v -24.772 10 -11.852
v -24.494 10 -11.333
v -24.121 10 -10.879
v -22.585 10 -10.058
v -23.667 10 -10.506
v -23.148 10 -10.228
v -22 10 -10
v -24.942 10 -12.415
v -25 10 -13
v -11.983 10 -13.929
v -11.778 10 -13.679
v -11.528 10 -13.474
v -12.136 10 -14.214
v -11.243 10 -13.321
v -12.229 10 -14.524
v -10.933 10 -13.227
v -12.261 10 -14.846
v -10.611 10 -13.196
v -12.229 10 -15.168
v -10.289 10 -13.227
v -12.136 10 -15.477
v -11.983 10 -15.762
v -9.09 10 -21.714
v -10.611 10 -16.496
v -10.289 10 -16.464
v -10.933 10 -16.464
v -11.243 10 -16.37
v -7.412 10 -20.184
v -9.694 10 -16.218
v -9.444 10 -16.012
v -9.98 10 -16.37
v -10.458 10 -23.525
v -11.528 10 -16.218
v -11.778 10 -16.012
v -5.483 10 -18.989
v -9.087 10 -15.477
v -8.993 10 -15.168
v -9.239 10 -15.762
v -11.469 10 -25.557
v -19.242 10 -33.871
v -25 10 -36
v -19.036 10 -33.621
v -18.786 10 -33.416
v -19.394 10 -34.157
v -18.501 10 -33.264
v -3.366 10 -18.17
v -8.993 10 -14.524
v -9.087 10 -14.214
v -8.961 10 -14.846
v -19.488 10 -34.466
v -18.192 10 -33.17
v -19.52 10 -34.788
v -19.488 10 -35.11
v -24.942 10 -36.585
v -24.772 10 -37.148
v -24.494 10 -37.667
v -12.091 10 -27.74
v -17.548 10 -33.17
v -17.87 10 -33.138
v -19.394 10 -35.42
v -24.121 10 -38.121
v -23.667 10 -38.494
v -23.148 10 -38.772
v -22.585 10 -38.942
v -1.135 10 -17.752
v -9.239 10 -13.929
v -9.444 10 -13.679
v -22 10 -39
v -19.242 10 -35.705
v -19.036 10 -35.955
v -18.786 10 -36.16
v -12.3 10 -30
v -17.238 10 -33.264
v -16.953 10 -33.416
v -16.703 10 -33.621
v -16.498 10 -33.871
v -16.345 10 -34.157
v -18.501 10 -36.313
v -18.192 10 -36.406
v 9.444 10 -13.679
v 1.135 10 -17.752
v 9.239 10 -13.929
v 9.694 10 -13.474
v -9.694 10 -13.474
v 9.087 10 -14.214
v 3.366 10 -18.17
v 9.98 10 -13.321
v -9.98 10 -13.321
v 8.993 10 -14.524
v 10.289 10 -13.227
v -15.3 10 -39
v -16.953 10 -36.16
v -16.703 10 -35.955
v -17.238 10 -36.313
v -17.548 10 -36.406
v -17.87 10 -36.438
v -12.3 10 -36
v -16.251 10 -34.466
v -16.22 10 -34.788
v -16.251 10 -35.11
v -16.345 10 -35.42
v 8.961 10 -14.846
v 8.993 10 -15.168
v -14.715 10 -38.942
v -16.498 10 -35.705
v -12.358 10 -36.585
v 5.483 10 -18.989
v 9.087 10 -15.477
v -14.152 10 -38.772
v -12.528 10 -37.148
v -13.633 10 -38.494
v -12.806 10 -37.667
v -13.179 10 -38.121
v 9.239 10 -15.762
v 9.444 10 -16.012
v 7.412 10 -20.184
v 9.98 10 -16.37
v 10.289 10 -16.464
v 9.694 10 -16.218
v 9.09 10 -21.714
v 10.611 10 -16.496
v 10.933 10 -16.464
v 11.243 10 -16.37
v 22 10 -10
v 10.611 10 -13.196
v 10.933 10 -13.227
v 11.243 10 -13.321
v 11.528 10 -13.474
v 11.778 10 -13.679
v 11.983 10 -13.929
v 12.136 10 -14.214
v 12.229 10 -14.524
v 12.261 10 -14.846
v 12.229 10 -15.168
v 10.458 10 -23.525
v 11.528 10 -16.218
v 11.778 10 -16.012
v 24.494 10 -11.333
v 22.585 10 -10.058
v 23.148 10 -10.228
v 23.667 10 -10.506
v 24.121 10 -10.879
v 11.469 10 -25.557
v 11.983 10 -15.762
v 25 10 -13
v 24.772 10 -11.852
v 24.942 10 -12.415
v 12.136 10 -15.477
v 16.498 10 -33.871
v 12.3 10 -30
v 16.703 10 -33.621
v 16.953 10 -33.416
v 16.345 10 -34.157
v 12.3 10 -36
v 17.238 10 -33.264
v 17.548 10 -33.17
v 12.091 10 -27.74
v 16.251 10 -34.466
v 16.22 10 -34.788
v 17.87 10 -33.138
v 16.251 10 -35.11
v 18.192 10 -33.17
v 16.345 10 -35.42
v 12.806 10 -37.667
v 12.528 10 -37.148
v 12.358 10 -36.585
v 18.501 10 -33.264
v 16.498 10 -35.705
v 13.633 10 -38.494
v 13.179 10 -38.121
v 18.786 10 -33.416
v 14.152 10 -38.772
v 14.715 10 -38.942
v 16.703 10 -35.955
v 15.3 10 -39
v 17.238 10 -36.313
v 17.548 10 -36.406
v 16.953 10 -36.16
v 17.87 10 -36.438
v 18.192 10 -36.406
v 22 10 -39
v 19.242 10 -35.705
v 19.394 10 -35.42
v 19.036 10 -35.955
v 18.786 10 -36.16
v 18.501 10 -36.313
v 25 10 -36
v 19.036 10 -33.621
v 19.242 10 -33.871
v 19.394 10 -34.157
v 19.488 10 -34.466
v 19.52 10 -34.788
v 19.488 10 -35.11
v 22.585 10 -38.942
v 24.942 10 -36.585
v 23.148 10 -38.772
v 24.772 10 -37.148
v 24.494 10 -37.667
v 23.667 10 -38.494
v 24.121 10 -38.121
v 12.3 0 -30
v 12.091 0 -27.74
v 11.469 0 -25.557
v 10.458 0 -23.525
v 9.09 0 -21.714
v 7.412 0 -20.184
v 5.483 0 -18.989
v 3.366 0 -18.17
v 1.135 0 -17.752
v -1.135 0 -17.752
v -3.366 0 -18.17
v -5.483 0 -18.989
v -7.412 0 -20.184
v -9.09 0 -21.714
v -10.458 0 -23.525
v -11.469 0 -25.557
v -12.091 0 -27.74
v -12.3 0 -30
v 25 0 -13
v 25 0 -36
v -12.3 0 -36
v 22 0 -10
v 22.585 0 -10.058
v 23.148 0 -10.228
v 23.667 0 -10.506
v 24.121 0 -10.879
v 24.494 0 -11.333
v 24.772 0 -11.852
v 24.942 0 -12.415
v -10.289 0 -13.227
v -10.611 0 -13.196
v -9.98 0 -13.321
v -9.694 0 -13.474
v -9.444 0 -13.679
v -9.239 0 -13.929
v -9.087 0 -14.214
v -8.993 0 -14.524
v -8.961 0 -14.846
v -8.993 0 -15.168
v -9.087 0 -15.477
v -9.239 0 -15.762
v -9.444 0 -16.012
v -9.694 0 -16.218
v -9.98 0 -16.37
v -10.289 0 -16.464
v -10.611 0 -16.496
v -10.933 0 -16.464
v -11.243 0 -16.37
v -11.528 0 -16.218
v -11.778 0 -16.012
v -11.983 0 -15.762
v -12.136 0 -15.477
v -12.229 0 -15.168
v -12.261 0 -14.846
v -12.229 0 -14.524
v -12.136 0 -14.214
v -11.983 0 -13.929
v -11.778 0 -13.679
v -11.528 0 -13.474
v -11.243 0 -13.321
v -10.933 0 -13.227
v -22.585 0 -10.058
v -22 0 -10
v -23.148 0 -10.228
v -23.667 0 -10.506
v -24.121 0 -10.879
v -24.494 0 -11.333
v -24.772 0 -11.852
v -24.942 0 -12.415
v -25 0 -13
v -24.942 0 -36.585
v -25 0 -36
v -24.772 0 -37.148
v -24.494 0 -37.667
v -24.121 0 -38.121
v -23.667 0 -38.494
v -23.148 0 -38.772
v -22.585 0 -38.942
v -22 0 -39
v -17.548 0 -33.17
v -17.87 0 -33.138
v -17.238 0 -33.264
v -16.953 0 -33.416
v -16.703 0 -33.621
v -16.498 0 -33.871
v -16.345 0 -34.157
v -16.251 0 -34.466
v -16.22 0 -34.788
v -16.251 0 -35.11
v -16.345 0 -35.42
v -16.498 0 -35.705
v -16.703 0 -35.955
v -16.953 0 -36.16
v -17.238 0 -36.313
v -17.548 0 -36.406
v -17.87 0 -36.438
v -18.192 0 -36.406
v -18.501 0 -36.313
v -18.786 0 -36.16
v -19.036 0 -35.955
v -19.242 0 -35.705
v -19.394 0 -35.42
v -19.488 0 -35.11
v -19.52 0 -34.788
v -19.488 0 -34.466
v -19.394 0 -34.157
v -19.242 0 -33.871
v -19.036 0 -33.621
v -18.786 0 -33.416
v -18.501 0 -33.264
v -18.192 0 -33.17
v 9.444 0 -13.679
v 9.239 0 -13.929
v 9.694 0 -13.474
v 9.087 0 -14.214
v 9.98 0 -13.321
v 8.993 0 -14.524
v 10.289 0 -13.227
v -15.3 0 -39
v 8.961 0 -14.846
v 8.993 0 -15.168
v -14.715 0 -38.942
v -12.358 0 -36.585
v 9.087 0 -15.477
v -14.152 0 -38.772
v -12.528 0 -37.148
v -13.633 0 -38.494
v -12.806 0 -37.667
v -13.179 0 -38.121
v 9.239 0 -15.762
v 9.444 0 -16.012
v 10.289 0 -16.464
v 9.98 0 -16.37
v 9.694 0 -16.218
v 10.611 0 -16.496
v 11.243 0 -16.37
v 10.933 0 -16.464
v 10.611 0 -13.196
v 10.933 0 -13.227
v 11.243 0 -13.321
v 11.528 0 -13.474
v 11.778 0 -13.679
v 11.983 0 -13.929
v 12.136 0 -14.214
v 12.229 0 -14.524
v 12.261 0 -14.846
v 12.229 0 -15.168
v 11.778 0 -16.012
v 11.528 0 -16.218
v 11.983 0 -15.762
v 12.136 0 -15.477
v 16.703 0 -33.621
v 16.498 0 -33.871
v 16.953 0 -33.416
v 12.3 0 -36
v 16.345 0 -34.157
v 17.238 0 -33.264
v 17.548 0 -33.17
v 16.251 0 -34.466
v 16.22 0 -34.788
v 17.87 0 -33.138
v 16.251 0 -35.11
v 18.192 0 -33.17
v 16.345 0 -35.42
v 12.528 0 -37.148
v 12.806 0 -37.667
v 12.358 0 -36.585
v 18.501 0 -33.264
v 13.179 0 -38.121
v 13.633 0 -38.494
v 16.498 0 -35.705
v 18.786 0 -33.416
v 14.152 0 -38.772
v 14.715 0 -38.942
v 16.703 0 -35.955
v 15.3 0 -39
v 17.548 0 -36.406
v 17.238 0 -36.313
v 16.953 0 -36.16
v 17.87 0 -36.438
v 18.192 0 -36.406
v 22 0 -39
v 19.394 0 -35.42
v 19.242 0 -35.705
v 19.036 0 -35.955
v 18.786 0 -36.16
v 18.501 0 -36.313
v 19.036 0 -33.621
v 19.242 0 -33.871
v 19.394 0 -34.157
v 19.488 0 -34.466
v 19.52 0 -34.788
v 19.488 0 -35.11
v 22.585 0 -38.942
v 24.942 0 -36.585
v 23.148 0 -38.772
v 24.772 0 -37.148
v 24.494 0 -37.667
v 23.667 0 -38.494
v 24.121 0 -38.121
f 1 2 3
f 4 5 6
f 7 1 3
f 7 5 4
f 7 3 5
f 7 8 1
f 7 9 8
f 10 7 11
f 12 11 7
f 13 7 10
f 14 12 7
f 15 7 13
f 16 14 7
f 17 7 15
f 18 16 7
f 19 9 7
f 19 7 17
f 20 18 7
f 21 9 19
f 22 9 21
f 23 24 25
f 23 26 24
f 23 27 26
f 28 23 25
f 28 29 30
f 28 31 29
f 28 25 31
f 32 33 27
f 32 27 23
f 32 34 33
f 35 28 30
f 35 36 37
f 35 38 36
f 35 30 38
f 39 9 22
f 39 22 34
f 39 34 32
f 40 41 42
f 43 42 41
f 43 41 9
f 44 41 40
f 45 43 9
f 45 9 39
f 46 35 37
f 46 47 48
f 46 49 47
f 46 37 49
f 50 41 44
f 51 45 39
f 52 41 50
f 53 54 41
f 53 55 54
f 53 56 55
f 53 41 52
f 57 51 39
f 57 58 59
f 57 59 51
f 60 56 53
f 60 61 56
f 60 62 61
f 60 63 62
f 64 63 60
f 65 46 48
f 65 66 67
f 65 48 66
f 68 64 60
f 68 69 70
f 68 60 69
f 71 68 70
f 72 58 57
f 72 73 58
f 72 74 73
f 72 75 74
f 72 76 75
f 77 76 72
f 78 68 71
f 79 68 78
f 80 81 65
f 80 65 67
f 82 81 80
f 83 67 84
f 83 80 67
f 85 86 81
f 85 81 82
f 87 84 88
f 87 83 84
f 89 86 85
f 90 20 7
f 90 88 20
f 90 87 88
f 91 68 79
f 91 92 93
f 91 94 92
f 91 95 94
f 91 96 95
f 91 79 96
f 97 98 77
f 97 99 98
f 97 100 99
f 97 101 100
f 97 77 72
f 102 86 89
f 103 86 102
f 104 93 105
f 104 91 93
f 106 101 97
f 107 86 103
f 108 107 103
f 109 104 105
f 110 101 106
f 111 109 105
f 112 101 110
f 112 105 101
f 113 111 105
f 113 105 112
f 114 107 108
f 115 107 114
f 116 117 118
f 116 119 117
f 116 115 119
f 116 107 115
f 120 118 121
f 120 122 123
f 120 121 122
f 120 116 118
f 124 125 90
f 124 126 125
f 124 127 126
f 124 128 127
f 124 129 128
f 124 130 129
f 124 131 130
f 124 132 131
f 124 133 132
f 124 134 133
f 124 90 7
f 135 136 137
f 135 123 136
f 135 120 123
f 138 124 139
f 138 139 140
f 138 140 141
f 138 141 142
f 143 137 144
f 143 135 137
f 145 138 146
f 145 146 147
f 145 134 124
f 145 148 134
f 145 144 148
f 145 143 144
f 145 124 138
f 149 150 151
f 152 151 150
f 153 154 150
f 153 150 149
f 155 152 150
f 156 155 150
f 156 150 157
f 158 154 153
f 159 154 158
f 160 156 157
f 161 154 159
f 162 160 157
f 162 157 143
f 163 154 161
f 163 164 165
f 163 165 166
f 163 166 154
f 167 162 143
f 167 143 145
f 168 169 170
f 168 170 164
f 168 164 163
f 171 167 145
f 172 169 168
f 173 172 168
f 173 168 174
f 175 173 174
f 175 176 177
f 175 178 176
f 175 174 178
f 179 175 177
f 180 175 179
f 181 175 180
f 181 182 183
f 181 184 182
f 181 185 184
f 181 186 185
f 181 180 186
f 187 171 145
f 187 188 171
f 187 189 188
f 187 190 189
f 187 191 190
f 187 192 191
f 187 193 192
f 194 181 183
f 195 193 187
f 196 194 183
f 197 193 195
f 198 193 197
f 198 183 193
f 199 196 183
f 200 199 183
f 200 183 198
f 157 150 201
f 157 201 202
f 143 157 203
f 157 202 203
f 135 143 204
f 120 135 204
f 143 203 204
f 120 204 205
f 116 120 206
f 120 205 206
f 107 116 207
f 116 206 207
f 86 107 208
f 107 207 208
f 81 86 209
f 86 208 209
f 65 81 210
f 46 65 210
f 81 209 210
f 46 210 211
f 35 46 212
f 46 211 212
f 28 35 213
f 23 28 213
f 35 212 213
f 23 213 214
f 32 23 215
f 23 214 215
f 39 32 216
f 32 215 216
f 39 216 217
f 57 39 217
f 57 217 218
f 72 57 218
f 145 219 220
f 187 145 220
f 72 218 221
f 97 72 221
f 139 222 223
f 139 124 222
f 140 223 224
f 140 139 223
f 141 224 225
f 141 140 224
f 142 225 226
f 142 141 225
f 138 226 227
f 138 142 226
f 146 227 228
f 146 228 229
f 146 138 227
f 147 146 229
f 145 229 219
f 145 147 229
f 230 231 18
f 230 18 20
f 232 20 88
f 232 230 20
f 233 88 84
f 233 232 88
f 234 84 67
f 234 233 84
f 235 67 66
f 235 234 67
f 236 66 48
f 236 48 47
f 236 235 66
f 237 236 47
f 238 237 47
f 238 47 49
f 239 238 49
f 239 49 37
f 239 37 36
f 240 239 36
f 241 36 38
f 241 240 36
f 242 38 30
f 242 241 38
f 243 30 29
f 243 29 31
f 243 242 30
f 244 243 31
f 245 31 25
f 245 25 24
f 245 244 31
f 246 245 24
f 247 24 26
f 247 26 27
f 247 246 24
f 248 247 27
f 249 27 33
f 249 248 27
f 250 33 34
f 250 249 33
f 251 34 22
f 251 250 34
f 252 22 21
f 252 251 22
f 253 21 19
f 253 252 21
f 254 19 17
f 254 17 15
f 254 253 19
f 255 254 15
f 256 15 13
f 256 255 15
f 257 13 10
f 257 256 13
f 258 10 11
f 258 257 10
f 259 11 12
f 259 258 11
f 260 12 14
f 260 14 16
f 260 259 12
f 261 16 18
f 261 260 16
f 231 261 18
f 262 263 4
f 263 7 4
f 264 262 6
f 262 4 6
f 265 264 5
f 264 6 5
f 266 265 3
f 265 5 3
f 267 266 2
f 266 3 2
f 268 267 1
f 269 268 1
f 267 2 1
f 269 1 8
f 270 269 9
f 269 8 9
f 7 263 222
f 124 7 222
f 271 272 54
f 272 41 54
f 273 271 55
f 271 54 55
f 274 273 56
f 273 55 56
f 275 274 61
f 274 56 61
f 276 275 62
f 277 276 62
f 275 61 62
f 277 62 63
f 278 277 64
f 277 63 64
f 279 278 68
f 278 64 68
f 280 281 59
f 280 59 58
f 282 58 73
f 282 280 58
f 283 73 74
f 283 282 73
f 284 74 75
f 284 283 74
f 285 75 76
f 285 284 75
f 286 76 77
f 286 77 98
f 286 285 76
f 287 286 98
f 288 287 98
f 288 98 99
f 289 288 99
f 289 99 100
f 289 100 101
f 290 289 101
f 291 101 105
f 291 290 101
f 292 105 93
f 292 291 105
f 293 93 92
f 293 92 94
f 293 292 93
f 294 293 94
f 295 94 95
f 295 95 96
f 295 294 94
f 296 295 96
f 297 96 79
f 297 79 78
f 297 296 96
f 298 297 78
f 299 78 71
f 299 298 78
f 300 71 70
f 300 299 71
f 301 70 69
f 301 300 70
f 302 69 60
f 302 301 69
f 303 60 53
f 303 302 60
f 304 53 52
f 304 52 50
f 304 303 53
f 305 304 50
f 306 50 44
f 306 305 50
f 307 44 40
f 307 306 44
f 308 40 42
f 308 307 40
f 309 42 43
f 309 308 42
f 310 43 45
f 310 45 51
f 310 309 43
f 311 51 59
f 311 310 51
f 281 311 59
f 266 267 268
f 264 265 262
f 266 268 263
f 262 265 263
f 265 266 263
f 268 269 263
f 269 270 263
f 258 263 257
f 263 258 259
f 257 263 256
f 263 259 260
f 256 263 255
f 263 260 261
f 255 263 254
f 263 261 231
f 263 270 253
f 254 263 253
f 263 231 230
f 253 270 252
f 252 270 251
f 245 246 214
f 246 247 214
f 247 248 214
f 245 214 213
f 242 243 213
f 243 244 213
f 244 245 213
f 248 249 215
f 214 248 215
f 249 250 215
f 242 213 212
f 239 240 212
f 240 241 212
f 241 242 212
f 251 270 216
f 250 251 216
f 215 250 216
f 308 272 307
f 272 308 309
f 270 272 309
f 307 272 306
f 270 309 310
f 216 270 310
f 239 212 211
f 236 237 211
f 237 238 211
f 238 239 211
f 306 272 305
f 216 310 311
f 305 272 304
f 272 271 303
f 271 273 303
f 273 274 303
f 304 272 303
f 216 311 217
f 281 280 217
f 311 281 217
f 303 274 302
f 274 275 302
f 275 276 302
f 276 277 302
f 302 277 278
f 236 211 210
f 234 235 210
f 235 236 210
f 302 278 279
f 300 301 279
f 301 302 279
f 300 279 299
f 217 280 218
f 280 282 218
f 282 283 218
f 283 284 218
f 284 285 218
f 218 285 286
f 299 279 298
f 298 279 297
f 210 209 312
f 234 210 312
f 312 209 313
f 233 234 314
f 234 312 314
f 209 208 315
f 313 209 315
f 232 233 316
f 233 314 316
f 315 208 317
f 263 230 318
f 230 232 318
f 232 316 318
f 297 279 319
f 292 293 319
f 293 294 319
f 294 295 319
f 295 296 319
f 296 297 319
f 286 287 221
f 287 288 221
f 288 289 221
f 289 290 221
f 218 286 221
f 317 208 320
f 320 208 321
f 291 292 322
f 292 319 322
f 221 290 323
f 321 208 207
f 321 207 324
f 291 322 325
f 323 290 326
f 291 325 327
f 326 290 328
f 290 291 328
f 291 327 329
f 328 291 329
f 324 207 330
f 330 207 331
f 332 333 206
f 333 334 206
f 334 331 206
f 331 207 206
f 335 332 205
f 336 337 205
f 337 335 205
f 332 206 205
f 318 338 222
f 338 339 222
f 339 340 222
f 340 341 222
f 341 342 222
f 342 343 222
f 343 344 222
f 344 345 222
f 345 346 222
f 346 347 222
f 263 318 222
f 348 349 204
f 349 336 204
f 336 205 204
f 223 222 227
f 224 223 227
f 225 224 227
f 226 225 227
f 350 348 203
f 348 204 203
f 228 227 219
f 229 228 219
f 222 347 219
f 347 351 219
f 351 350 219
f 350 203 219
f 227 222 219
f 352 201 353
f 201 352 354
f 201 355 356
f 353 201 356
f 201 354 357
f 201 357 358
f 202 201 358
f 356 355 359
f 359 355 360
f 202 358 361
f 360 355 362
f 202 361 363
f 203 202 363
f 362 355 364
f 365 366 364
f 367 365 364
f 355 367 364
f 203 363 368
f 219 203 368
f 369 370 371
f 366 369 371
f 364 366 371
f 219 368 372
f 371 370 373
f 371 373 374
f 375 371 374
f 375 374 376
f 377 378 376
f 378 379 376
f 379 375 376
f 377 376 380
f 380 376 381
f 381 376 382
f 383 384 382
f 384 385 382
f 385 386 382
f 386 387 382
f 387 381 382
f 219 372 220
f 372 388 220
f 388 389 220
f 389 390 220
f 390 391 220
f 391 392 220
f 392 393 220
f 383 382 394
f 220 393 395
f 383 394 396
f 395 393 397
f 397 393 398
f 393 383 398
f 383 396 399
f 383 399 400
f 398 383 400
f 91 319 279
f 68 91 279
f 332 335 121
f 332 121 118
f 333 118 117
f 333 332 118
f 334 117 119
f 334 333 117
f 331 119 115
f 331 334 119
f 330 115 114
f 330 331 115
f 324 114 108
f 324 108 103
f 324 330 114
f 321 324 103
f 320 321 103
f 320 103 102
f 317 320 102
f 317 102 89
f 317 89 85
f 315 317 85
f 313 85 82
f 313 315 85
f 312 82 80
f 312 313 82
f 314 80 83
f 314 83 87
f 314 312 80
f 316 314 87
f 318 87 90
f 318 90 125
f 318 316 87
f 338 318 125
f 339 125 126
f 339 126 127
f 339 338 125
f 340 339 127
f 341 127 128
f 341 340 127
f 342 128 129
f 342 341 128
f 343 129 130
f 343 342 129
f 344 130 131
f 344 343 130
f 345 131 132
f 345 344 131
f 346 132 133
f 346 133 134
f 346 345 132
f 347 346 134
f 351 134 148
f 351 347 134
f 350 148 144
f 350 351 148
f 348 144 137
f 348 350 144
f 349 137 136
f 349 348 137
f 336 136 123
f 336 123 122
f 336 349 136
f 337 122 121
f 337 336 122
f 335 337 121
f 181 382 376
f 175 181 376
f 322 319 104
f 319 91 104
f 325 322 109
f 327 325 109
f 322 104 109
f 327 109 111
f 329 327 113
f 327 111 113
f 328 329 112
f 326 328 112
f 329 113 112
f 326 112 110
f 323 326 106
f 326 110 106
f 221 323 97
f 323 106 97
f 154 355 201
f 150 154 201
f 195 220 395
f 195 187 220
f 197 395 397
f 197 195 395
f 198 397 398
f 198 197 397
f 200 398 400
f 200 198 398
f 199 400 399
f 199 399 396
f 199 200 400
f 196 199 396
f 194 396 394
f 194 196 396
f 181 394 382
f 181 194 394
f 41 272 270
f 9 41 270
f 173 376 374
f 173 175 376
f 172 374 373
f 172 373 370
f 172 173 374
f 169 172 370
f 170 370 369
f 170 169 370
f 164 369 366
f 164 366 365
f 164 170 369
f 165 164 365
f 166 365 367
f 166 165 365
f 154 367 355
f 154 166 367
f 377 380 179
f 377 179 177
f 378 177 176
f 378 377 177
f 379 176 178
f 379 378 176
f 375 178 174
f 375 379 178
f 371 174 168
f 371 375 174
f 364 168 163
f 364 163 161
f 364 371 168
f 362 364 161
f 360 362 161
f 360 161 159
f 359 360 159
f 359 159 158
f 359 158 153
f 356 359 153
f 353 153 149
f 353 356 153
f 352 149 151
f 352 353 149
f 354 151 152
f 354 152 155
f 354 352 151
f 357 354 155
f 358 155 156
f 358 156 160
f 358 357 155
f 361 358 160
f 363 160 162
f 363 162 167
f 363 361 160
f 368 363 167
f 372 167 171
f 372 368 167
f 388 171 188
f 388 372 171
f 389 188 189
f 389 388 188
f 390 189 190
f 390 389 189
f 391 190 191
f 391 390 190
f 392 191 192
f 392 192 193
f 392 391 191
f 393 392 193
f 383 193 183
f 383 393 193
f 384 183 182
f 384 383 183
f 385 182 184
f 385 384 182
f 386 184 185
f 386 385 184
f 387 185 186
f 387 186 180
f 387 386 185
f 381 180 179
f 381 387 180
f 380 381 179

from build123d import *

# Parameters (mm, degrees)
SKETCH_1_R      = 1.65
EXTRUDE_1_DEPTH = 10
FILLET_1_R      = 3


with BuildPart() as part:
    # 草图1 → 凸台-拉伸1 (new body)
    with BuildSketch(Plane(origin=(0, 0, 0), x_dir=(1, 0, 0), z_dir=(0, 1, 0))):
        with BuildLine():
            Line((-25, 30), (-25, 10))
            Line((-25, 10), (25, 10))
            Line((25, 10), (25, 30))
            Line((25, 30), (25, 39))
            Line((25, 39), (12.3, 39))
            Line((12.3, 39), (12.3, 30))
            ThreePointArc((12.3, 30), (0, 17.7), (-12.3, 30))
            Line((-12.3, 30), (-12.3, 39))
            Line((-12.3, 39), (-25, 39))
            Line((-25, 39), (-25, 30))
        make_face()
        with Locations(Location((-10.611164072, 14.845687181, 0), (0, 0, 270))):
            Circle(SKETCH_1_R, mode=Mode.SUBTRACT)
        with Locations(Location((-17.869627786, 34.788152334, 0), (0, 0, 270))):
            Circle(SKETCH_1_R, mode=Mode.SUBTRACT)
        with Locations(Location((10.611164072, 14.845687181, 0), (0, 0, 90))):
            Circle(SKETCH_1_R, mode=Mode.SUBTRACT)
        with Locations(Location((17.869627786, 34.788152334, 0), (0, 0, 90))):
            Circle(SKETCH_1_R, mode=Mode.SUBTRACT)
    extrude(amount=EXTRUDE_1_DEPTH)

    # 圆角1
    fillet_1_edges = [part.edges().sort_by_distance(p)[0] for p in [
        (25, 5, -10),
        (-25, 5, -10),
        (-25, 5, -39),
        (-12.3, 5, -39),
        (12.3, 5, -39),
        (25, 5, -39),
    ]]
    fillet(fillet_1_edges, radius=FILLET_1_R)


solid = part.part
